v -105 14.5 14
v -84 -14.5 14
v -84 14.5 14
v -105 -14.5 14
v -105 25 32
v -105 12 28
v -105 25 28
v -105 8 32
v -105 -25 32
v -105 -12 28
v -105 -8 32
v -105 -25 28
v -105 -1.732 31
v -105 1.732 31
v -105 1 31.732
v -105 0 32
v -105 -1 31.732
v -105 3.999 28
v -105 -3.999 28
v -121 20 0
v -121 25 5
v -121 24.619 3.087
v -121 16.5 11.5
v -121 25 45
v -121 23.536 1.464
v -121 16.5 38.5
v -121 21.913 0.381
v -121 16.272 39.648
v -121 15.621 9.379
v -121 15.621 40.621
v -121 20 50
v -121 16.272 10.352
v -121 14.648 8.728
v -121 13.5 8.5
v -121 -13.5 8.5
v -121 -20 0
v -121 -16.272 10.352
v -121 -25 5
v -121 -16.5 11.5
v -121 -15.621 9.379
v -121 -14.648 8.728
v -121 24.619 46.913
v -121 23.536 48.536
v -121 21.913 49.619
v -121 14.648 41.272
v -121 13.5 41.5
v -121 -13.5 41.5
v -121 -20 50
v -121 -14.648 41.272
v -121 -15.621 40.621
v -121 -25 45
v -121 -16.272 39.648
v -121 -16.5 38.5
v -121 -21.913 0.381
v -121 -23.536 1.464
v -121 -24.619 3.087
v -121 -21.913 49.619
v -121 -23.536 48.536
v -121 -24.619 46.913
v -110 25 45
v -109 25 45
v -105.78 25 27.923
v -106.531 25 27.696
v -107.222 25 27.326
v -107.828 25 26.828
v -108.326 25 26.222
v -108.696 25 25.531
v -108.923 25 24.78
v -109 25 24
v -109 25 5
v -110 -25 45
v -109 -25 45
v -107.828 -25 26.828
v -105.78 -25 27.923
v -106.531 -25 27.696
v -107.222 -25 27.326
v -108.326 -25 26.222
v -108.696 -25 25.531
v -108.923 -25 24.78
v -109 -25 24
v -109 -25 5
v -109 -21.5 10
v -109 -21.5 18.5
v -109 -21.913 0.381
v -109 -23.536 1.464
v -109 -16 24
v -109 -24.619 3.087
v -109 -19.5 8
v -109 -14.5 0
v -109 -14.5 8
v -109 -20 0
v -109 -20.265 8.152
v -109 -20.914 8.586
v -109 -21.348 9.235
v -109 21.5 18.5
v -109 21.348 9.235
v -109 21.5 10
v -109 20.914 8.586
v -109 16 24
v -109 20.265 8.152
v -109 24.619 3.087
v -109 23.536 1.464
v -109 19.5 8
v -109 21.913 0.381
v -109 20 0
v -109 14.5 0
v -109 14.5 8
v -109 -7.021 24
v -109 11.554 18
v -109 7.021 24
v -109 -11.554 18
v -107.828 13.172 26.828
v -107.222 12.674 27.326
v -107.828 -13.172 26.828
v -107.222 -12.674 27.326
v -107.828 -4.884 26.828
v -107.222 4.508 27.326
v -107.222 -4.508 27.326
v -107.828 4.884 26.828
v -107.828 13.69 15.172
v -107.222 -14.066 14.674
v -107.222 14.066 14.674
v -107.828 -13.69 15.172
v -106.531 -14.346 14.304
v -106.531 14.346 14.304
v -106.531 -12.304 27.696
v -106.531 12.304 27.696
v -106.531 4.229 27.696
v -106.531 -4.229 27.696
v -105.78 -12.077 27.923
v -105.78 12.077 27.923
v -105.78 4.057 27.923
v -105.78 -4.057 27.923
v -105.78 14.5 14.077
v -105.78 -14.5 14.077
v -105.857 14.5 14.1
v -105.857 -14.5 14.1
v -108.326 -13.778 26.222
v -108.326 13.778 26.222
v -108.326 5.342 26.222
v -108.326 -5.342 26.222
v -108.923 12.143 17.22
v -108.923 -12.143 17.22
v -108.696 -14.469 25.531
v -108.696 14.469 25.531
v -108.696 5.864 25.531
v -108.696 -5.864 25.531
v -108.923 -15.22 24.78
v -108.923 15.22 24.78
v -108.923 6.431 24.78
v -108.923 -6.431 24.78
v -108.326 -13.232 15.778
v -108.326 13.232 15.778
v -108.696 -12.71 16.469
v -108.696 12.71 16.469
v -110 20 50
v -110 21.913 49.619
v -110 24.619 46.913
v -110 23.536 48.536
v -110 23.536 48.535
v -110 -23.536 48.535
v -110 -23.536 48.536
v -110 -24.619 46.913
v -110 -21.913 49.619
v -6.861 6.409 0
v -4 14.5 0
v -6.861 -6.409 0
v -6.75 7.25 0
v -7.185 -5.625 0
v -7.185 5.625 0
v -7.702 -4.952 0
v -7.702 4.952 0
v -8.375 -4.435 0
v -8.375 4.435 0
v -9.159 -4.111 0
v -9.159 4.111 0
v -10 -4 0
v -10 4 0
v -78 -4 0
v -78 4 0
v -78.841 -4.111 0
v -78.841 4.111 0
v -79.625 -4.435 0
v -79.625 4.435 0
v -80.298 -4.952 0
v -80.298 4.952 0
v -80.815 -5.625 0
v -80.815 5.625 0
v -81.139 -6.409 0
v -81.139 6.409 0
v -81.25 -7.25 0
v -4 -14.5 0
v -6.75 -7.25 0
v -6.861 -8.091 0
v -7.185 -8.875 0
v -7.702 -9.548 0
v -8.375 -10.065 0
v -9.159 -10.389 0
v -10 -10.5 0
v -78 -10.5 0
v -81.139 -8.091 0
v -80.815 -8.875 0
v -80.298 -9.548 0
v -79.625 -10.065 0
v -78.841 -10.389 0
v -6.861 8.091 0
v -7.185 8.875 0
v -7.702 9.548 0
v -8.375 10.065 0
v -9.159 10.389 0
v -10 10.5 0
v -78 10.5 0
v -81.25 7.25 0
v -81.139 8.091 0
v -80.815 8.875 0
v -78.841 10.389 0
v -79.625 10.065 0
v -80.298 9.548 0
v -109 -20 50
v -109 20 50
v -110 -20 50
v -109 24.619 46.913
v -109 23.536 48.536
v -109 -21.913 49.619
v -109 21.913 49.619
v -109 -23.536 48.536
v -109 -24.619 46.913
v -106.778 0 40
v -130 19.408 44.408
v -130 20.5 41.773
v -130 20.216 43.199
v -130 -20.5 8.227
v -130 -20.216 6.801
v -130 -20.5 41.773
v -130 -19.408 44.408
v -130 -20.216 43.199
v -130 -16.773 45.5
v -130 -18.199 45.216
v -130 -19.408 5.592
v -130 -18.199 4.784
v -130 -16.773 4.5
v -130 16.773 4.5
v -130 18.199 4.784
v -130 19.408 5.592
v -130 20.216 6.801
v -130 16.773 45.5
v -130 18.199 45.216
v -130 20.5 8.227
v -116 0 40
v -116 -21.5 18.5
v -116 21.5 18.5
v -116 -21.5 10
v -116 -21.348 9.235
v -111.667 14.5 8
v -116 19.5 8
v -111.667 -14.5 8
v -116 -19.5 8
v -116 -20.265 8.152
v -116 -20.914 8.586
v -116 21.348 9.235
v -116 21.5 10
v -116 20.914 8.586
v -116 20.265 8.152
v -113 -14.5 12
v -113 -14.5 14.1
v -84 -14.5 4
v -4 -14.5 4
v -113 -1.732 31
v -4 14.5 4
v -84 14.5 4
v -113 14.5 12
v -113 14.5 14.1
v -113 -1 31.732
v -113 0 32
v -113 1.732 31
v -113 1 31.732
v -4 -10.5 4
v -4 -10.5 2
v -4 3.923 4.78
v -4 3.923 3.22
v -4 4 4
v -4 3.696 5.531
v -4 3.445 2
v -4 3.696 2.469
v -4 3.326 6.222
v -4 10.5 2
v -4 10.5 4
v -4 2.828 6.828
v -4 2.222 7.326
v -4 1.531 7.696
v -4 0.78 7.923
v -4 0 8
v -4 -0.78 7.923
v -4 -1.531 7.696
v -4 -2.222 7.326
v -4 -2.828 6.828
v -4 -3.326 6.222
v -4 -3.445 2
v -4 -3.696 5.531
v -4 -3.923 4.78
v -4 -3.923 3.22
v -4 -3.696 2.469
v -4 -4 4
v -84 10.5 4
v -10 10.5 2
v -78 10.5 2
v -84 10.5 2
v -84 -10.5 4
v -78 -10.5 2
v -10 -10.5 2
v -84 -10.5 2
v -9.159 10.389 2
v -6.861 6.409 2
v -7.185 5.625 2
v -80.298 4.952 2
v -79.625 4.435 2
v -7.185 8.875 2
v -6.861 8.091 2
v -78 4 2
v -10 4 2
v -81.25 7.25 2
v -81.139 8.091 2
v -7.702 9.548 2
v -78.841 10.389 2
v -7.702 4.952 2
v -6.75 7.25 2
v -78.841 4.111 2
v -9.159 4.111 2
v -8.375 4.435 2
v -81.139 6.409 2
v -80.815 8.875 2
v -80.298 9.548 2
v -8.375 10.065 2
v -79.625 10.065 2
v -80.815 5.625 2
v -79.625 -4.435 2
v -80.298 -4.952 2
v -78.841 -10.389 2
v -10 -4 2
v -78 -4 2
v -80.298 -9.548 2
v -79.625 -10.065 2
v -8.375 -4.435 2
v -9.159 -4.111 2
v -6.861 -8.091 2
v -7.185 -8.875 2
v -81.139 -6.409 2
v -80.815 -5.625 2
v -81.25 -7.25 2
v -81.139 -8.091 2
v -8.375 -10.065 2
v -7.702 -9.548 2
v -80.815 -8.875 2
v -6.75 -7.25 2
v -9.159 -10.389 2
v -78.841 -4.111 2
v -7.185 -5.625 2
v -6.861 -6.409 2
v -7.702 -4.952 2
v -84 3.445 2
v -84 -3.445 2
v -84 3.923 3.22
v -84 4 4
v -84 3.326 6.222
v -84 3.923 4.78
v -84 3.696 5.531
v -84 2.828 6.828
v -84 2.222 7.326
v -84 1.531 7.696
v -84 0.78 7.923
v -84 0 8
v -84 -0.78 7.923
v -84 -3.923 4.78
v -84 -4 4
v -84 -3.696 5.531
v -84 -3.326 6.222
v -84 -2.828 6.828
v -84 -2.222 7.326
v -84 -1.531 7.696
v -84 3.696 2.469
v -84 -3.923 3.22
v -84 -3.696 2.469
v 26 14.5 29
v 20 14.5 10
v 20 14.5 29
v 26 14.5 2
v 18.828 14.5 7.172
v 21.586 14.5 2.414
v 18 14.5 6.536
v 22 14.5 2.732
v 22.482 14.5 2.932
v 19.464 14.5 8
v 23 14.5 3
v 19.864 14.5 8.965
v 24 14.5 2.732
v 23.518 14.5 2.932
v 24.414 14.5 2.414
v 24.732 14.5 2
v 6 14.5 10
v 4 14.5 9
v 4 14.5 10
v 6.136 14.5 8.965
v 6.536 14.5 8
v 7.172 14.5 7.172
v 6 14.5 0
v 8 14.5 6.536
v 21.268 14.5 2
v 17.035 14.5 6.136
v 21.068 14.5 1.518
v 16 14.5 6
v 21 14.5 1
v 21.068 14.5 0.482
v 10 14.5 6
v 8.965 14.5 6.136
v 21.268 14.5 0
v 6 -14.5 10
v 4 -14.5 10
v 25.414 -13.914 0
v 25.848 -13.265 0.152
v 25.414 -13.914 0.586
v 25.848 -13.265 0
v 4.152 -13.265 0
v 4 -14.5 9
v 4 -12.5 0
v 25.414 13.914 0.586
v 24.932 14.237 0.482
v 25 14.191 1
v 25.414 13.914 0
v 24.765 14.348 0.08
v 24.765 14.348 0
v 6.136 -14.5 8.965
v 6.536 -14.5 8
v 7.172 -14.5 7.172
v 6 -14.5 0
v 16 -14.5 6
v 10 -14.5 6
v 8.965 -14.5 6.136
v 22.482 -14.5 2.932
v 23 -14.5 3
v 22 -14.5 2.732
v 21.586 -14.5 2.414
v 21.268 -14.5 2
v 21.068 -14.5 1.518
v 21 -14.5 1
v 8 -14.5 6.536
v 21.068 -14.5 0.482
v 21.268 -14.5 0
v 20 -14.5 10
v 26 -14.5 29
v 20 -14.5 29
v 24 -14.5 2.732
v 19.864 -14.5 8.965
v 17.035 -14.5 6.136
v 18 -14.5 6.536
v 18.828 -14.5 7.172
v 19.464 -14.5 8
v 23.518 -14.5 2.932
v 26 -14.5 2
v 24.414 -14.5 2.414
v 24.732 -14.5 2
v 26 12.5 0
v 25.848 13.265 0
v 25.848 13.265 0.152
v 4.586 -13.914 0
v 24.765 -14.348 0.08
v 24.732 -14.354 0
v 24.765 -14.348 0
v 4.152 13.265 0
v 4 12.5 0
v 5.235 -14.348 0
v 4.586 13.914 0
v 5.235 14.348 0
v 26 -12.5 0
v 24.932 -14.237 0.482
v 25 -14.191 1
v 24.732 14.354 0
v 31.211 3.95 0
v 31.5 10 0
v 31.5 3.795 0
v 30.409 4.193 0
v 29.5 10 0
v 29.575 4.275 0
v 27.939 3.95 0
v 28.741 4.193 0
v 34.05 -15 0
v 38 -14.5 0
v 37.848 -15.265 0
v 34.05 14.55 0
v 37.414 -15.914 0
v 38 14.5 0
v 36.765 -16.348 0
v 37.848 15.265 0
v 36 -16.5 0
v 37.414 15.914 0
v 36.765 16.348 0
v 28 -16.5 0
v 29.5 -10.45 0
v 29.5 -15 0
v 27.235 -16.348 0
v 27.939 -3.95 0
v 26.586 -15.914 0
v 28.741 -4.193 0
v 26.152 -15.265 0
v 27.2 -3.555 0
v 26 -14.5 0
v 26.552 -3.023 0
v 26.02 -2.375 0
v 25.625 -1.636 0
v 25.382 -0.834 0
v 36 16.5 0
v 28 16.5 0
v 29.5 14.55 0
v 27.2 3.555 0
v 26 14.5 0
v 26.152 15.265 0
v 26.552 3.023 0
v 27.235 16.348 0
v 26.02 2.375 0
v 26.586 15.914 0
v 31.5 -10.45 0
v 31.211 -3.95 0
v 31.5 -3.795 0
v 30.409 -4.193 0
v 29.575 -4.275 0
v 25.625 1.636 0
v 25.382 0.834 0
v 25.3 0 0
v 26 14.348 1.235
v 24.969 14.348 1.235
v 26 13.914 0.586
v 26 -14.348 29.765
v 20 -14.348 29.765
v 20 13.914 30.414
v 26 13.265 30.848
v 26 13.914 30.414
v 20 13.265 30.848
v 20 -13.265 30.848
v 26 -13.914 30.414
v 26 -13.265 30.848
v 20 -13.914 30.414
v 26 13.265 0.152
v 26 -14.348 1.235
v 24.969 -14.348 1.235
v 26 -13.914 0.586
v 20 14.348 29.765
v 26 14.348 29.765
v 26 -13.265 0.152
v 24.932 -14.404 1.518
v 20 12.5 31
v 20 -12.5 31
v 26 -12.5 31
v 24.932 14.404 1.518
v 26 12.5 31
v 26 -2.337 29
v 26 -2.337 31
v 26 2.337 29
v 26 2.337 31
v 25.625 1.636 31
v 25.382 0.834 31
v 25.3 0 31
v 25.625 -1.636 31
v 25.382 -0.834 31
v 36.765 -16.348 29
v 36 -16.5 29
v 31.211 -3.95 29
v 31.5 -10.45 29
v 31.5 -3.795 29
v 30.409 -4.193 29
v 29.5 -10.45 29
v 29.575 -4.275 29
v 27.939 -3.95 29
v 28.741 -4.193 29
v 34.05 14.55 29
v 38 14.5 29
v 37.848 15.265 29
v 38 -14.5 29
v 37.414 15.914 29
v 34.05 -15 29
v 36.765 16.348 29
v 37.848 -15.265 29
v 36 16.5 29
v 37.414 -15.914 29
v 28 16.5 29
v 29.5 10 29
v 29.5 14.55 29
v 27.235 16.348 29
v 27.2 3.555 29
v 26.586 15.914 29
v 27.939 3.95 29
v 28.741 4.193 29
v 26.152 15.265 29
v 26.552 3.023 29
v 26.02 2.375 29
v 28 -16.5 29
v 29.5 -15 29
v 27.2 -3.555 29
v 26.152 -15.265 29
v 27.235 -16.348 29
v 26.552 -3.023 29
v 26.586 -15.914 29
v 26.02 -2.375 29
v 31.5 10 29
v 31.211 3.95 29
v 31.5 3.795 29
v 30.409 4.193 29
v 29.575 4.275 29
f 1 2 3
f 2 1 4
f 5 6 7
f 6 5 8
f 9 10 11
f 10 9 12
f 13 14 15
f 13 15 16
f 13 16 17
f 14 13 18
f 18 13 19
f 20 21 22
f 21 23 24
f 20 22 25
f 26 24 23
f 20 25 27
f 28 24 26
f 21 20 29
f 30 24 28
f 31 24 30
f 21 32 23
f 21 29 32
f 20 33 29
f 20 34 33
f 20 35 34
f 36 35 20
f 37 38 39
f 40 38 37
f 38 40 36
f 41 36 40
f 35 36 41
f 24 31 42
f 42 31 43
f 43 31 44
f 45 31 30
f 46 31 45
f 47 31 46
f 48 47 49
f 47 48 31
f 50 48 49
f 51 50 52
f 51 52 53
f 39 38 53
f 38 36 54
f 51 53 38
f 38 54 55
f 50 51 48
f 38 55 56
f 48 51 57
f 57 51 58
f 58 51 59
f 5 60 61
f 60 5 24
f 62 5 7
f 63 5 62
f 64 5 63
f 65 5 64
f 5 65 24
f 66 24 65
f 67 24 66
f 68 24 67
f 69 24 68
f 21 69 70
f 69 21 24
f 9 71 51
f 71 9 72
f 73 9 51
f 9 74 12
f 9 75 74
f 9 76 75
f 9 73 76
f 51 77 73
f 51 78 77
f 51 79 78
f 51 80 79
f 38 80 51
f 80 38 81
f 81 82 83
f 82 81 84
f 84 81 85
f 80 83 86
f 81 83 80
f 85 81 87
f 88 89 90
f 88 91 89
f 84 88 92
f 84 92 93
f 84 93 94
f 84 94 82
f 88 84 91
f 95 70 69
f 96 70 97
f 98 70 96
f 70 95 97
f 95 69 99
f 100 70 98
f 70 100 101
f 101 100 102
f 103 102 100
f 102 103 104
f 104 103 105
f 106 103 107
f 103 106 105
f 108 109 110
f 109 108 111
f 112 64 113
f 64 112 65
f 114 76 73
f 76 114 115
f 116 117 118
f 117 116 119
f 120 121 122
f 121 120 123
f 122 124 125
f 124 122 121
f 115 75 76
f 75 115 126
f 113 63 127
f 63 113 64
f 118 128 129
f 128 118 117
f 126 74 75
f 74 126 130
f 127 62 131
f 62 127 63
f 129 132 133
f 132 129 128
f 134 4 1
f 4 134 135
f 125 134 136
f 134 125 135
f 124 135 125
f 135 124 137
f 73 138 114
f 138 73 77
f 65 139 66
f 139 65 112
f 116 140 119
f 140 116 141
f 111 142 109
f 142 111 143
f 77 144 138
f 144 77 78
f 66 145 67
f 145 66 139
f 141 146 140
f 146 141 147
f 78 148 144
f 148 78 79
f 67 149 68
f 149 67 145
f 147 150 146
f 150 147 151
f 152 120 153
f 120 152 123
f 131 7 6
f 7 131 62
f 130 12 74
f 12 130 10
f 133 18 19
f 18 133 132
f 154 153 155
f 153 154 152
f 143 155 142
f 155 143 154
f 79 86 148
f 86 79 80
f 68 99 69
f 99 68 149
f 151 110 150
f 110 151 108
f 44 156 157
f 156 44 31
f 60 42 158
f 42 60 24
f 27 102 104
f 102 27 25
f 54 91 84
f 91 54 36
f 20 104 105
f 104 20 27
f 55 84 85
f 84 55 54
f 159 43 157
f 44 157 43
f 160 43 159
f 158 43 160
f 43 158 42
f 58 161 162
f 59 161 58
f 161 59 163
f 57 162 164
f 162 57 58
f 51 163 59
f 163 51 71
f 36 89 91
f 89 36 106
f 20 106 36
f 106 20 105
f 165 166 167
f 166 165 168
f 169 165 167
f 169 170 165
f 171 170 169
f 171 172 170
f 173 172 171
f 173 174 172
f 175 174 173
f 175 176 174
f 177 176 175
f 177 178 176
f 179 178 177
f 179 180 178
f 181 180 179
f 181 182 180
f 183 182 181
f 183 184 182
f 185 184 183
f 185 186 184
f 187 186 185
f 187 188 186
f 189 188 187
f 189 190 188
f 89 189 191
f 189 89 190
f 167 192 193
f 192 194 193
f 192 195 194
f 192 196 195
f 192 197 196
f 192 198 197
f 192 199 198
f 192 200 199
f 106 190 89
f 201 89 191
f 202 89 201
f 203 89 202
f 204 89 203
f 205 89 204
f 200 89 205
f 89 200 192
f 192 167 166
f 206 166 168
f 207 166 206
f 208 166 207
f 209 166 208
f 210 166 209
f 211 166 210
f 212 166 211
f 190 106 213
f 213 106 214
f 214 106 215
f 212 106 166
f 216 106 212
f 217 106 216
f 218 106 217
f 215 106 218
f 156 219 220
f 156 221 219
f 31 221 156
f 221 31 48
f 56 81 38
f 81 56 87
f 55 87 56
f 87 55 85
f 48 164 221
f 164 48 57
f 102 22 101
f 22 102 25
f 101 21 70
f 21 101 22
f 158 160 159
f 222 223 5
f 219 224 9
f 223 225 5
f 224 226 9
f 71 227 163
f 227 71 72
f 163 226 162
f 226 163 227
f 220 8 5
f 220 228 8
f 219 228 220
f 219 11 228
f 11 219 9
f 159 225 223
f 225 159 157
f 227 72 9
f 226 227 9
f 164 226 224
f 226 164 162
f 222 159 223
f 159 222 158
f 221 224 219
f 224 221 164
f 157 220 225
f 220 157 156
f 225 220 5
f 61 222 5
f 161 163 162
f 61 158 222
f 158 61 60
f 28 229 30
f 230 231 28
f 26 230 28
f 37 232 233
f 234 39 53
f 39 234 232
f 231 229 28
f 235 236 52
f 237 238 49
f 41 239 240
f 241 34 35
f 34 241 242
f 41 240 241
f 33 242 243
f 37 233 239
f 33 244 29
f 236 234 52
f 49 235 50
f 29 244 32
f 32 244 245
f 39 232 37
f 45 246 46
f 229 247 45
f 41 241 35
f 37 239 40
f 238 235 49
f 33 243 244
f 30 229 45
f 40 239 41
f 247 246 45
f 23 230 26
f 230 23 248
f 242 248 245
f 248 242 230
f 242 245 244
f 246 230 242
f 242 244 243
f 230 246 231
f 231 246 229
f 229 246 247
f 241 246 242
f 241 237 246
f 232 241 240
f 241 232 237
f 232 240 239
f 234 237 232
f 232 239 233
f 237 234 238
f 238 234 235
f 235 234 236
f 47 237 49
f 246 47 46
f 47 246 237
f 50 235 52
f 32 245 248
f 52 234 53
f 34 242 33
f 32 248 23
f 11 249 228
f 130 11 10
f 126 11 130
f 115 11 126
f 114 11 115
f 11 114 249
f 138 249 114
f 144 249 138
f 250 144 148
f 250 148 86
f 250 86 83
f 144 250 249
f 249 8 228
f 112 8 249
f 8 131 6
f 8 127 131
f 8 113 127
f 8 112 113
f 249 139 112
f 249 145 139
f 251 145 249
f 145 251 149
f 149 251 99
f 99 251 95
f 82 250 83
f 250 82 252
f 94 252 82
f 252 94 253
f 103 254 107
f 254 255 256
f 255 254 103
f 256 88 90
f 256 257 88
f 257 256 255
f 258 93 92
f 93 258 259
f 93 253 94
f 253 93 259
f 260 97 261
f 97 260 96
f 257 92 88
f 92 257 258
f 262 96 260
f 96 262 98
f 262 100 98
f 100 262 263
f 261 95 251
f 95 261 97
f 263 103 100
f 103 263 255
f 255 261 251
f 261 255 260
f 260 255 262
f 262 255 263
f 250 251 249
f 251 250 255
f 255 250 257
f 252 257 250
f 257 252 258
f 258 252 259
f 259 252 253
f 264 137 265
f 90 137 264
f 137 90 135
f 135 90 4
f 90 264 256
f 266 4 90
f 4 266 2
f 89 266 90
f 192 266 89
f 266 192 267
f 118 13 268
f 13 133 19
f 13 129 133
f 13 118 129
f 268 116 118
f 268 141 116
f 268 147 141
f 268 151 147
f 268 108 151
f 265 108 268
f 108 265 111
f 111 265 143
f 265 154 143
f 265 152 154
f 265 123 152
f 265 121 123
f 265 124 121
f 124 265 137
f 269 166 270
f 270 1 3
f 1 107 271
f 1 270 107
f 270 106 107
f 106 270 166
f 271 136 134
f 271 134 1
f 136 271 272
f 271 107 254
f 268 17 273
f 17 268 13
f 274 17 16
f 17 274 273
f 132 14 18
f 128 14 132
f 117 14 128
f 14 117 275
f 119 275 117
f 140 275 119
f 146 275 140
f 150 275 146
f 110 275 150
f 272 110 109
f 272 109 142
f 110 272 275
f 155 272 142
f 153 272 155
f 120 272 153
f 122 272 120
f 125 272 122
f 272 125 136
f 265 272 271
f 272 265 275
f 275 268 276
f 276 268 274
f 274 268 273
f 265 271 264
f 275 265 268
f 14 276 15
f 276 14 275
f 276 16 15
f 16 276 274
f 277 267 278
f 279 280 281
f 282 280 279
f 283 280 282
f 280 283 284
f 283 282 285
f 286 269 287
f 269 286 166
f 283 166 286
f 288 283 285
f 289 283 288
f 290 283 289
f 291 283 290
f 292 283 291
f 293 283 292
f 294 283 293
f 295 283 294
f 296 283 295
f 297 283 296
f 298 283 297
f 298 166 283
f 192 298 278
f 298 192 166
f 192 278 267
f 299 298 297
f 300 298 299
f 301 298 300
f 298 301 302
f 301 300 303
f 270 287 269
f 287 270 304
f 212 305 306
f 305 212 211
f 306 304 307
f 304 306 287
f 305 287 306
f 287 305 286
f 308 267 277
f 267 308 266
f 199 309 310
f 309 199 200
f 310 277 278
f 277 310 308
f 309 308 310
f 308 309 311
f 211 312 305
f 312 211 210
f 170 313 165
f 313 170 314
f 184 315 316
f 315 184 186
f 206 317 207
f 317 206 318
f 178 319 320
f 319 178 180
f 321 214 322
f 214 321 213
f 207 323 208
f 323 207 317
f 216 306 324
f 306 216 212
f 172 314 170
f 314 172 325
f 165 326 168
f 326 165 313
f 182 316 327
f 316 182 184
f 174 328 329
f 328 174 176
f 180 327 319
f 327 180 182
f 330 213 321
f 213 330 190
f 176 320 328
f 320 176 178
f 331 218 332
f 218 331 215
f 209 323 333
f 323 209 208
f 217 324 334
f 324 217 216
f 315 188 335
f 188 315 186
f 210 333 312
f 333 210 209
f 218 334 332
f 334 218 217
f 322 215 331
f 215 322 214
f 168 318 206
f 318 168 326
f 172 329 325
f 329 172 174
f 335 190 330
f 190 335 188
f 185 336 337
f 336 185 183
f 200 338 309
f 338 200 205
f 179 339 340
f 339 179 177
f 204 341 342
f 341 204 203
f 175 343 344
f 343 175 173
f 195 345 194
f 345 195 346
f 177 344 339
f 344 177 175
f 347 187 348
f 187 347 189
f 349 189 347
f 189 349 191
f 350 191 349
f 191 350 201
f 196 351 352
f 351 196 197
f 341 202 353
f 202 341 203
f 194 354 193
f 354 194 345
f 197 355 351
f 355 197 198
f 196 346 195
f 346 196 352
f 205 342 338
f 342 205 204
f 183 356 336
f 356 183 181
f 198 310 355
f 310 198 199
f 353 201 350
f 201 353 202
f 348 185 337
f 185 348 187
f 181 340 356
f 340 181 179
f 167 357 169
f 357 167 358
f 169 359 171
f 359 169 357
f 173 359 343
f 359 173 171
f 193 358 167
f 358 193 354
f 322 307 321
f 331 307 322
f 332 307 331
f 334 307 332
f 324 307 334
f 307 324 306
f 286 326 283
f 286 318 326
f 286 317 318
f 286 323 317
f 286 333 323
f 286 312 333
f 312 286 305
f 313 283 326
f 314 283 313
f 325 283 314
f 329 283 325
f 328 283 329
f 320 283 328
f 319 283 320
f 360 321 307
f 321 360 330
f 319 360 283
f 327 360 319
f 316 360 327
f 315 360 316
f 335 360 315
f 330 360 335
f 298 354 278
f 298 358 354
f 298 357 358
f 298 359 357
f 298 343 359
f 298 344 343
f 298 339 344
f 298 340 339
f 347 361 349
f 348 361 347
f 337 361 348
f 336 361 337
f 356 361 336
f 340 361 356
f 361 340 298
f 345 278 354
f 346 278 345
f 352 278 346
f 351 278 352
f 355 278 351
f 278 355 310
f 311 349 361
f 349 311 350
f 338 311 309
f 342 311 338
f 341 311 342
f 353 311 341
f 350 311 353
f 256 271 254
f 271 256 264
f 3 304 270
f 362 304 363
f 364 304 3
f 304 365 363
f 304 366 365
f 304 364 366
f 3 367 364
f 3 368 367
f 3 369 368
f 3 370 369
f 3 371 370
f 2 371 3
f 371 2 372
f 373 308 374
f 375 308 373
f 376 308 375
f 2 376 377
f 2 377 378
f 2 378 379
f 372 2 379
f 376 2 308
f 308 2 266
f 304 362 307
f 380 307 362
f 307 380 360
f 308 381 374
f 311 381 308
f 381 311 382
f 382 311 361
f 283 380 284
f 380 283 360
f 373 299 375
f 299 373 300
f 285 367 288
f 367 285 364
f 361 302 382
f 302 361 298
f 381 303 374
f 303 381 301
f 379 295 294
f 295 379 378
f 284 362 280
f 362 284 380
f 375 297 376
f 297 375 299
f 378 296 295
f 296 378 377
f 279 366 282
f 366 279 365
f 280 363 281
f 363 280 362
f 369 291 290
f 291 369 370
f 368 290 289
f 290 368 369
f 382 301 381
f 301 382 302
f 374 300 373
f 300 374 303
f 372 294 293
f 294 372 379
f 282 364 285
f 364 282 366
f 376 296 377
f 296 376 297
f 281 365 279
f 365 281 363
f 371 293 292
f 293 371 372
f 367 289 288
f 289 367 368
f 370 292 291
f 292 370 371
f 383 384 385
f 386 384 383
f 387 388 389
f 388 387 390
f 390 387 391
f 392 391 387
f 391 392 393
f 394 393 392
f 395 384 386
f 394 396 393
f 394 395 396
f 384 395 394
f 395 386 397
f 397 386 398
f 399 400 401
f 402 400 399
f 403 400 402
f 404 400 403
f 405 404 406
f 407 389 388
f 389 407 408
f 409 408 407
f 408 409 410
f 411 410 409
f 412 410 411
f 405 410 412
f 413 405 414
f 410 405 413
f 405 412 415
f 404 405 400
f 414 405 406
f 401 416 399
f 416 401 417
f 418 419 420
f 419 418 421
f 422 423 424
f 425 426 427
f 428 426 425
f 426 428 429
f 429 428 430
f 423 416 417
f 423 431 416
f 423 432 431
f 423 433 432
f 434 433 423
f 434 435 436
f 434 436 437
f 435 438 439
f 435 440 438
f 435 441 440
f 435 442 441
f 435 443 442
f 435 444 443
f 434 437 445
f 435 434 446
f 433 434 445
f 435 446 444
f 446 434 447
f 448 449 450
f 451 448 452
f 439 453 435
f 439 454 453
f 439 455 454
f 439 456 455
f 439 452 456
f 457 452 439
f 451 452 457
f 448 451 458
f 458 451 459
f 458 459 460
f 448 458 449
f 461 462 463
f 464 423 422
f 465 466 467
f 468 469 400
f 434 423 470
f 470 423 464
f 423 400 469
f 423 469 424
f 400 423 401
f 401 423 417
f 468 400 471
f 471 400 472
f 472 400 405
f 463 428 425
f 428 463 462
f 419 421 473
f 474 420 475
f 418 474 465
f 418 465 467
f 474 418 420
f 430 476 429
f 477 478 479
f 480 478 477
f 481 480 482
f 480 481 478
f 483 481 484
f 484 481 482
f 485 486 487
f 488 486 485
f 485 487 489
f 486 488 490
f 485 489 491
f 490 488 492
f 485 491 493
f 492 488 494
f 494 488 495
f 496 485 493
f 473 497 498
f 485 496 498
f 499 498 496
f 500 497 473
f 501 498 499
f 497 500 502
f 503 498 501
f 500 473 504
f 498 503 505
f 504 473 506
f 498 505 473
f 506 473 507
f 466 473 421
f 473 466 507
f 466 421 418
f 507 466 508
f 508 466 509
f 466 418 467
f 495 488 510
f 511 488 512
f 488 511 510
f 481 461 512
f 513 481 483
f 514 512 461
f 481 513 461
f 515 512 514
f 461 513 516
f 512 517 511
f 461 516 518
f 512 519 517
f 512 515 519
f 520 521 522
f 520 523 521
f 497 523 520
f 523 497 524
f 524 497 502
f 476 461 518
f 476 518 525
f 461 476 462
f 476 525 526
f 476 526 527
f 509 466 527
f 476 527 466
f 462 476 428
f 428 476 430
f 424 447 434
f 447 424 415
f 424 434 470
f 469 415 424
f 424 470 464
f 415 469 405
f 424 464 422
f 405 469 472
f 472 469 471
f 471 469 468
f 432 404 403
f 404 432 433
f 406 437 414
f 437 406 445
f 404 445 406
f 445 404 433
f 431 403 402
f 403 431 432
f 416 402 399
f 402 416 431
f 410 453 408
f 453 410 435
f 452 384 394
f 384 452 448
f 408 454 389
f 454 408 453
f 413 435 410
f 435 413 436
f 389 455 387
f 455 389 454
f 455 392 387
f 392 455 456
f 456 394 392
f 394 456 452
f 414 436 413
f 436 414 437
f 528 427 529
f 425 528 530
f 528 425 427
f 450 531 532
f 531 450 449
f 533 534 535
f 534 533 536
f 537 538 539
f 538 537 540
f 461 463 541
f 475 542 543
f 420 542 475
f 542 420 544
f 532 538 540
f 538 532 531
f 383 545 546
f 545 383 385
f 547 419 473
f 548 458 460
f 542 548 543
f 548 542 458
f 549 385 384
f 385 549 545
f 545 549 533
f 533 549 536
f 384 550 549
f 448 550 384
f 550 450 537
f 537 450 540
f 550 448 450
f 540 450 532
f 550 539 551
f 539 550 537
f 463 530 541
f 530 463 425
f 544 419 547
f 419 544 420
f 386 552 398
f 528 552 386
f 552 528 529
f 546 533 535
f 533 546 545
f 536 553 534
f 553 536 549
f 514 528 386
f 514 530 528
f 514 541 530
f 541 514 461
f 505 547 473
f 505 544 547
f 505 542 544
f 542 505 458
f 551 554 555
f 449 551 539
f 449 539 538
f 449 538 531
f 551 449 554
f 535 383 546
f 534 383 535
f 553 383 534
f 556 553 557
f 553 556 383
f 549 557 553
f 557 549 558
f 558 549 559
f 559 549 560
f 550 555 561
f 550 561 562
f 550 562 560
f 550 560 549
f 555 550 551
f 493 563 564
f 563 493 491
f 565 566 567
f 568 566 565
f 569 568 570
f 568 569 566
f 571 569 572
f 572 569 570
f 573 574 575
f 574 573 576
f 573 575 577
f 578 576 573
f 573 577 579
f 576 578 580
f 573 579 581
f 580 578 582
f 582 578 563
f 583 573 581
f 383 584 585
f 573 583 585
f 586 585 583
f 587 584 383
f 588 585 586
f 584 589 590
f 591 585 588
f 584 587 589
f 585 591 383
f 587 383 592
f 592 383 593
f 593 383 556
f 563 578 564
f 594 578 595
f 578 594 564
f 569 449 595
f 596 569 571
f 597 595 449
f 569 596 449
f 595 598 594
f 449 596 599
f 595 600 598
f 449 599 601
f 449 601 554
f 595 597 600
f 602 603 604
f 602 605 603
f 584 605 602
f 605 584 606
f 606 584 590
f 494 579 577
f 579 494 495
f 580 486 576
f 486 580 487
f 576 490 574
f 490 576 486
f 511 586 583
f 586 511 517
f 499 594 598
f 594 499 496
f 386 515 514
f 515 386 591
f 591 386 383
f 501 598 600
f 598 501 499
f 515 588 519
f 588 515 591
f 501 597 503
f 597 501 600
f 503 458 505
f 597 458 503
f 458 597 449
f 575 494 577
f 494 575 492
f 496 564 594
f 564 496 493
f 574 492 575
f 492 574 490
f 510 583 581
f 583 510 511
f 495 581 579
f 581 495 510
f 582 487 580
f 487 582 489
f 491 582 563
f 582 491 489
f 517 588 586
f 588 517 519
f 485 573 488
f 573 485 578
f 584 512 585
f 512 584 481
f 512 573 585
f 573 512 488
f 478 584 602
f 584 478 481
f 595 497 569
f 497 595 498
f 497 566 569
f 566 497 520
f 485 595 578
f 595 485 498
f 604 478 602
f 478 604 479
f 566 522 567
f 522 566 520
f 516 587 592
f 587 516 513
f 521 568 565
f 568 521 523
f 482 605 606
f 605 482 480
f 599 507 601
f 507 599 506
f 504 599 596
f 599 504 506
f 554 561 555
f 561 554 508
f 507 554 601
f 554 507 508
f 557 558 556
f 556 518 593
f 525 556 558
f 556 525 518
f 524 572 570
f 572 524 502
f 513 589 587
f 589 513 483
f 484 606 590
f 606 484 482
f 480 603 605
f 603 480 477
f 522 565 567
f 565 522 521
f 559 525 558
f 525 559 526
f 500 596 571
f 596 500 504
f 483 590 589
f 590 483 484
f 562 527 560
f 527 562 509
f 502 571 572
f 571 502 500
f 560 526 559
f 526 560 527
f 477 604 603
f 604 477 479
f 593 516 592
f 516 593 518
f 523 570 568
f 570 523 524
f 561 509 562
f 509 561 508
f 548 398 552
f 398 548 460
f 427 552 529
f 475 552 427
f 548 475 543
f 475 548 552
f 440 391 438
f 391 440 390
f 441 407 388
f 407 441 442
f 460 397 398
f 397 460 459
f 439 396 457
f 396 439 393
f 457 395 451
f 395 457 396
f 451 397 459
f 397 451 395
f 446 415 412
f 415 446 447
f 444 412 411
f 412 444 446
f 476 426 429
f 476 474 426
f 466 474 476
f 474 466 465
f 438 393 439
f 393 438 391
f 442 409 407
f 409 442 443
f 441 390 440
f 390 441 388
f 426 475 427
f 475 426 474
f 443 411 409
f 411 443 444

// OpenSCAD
// -- VARIABLES ---
//height or thickness of the clip/shoe in mm
clip_base = 41;
//inner/upper measurement of the clip/shoe in mm
clip_in = 33;
//height or thickness of the clip/shoe in mm
clip_h = 9;
//width [side of square] of the platform, in mm
plat_w = 50;
//height or thickness of the platform, in mm
plat_h = 12;
//height or length of the slidey posts, in mm
post_h = 105;
//width or thickness of the slidey posts, in mm
post_w = 4;
// "backrest width", mm
br_w = 6;
// "backrest height", mm
br_h = 25;
// "backrest spacing", mm
br_s = 4;
// width of the band (hair tie), in mm
band_w = 4;
//thickness of the phone, in mm (14 should be OK for most phones/cases)
phone_thick = 14;
//make this number larger if the slidey posts are too snug in the slidey post holes
hole_clearance = 0.55;
band_r = band_w/2;
//if you prefer my hard-coded supports to those of your printer software, uncomment the supports section below
support_th = 0.6;

module round_rect(w, l, r){
	translate([-(w-2*r)/2, -(l-2*r)/2, 0])minkowski(){
		square([w-2*r, l-2*r]);
		circle(r, $fn=16);
	}
}

// -- BASE ---
translate([-br_s-post_h, 0, 0])
	union(){
        //backstop
		hull(){
			translate([0, -(plat_w/2+post_w)/2, 0])
				cube([br_h, plat_w/2+post_w, post_w+br_s]);
			translate([-band_w, -plat_w/4-post_w/2, post_w+br_s+br_w-(br_w-band_w)])
				cube([br_h + band_w, plat_w/2+post_w, br_w-band_w]);
		}
		difference(){
			translate([-plat_h, 0, plat_w/2]){
                //clip-shoe
				rotate([0, 270, 0])
					linear_extrude(height=clip_h, scale=[clip_base/clip_in, clip_base/clip_in])
						round_rect(clip_in,clip_in,3);
				rotate([0, 90, 0]){
                    //Base
					linear_extrude(height=plat_h)
						round_rect(plat_w, plat_w, 5);
                    // LIP
                    difference(){
                        translate([plat_w/2-(post_w+br_s+br_w)-(phone_thick+band_w), -plat_w/2, 0])cube([phone_thick+band_w, plat_w, plat_h+band_w]);
                        translate([band_w,-plat_w/2,plat_h])cube([plat_w/3,plat_w/8,band_w*2]);
                        translate([band_w,plat_w/2-plat_w/8,plat_h])cube([plat_w/3,plat_w/8,band_w*2]);
                        hull(){
                            translate([plat_w/2-phone_thick-band_w,-plat_w/2,plat_h+band_w])
                            rotate([-90,0,0])
                            cylinder(r=band_w, h=plat_w, $fn=32);
                            translate([plat_w/2-phone_thick*2+band_w,-plat_w/2,plat_h+band_w])
                            rotate([-90,0,0])
                            cylinder(r=band_w, h=plat_w, $fn=32);
                        }
                    }
                    hull(){
                        translate([plat_w/2-(post_w+br_s+br_w)-(phone_thick+band_w), -plat_w/2, 0])cube([1, plat_w, plat_h+band_w]);
                        translate([-plat_w/2+5,plat_w/2-5,plat_h-1])cylinder(r=5, h=1);
                        translate([-plat_w/2+5,-plat_w/2+5,plat_h-1])cylinder(r=5, h=1);
                    }
				}
			}
			difference(){
				translate([plat_h+1, 0, (phone_thick + br_w + band_r*6)/2 + post_w + br_s])
					rotate([0, 270, 0])
						linear_extrude(height=band_w*2+plat_h)
							round_rect(phone_thick+br_w+band_r*6, plat_w/2+post_w+band_w*3.5, band_r);
				for (i=[-1,1]){
					translate([-band_w*2, i*plat_w*sqrt(2)/2, -plat_w*sqrt(2)/2+(phone_thick + br_w + band_r*6) + post_w + br_s])
						rotate([45, 0, 0])
							cube([band_w*2+plat_h+2, plat_w, plat_w]);
				}
			translate([0, 0, br_s + post_w + br_w])
				hull(){
					translate([-band_w, 0, band_r + phone_thick])
						rotate([0, 90, 0])
							cylinder(h=band_w*3, r=band_r, $fn=12);
						translate([-band_w, -plat_w/4 - post_w/2, 0])
							cube([band_w*3, plat_w/2 + post_w, 0.1]);
				}
			}
		}
        //POST
		for (i=[1,-1]){
			translate([0, -post_w/2 + i*plat_w/4, 0])cube([post_h, post_w, post_w]);
		}
        translate([0,0,post_w])rotate([0,90,0])cylinder(r=post_w, h=post_h, $fn=32);
        difference(){
            translate([0,-plat_w/4,0])cube([post_h, plat_w/2, post_w*0.5]);
            for (i=[1,-1]){
                hull(){
                    translate([post_h-post_w*1.5,i*(plat_w/8+post_w/4),0])cylinder(r=(plat_w/4 - post_w*1.5)/2, h=post_w, $fn=24);
                    translate([br_h+post_w*1.5,i*(plat_w/8+post_w/4),0])cylinder(r=(plat_w/4 - post_w*1.5)/2, h=post_w, $fn=24);
                }
            }
        }
	}



// -- base supports ---
//translate([-plat_h-br_s-post_h-clip_h,0,0]){
//    difference(){
//        translate([0,-21,0])cube([8,40,8]);
//        for (i = [-21:6:21]){
//            translate([0,i,0])cube([clip_h-1-support_th,3-support_th,clip_h-1]);
//            translate([support_th,i-3,0])cube([clip_h-1-support_th,3-support_th,clip_h-1]);
//        }
//        translate([clip_h, 0, plat_w/2 - 0.05])
//        rotate([0, 270, 0])
//        linear_extrude(height=clip_h, scale=[clip_base/clip_in, clip_base/clip_in])
//        round_rect(clip_in,clip_in,3);
//    }
//}


// -- TOP --
difference(){
	union(){
        difference(){
            hull(){
                translate([br_s+(phone_thick+band_r+br_w)/2, 0, 0])
                    linear_extrude(height=br_w)
                        round_rect(phone_thick+band_r+br_w, plat_w/2 + post_w, band_r);
                // ---lip
                translate([br_s, -(plat_w/2 + band_w)/2, br_w+band_w-1])
                    cube([phone_thick+band_r, plat_w/2 + band_w, 1]);
            }
            hull(){
                translate([br_s+phone_thick-band_r,-plat_w/4-band_r,br_w+band_w])rotate([-90,0,0])cylinder(h=plat_w/2+band_w, r=band_w, $fn=24);
                translate([br_s+band_w*1.5,-plat_w/4-band_r,br_w+band_w])rotate([-90,0,0])cylinder(h=plat_w/2+band_w, r=band_w, $fn=24);
            }
        }
        
        //backrest
		translate([br_s + band_r + phone_thick, 0, (br_w+br_h)/2])
			rotate([0, 90, 0])
				linear_extrude(height=br_w)
					round_rect(br_w+br_h, plat_w/2 + post_w, band_r);
        //slothouse
		translate([(br_w*2+br_s*2 + post_w)/2+br_s+band_r+phone_thick, 0, 0])
			linear_extrude(height=br_w+br_h-band_r)
				round_rect(br_s*2 + post_w, plat_w/2 + post_w+band_w, band_r);
	}
    // slide holes
	for (i=[1,-1]){
		translate([br_s*2+band_r+phone_thick+br_w-0.5, -(post_w+1)/2 + i*plat_w/4, -5])
			cube([post_w+hole_clearance, post_w+hole_clearance, post_h]);
	}
    translate([br_s*2+band_r+phone_thick+br_w-0.5+post_w/2, -plat_w/4, -5])cube([post_w/2+hole_clearance,plat_w/2,post_h]);
    translate([br_s*2+band_r+phone_thick+br_w-0.425,0,-5])cylinder(r=post_w+hole_clearance/2, h=post_h, $fn=32);
    
    // Band Slot
	translate([br_s+band_r*2.5+phone_thick, 0, 0])
		rotate([90,0,0])translate([0,band_r/2,-(br_h+br_w)/2])cylinder(r=band_r, h=br_h+br_w, $fn=24);
}
